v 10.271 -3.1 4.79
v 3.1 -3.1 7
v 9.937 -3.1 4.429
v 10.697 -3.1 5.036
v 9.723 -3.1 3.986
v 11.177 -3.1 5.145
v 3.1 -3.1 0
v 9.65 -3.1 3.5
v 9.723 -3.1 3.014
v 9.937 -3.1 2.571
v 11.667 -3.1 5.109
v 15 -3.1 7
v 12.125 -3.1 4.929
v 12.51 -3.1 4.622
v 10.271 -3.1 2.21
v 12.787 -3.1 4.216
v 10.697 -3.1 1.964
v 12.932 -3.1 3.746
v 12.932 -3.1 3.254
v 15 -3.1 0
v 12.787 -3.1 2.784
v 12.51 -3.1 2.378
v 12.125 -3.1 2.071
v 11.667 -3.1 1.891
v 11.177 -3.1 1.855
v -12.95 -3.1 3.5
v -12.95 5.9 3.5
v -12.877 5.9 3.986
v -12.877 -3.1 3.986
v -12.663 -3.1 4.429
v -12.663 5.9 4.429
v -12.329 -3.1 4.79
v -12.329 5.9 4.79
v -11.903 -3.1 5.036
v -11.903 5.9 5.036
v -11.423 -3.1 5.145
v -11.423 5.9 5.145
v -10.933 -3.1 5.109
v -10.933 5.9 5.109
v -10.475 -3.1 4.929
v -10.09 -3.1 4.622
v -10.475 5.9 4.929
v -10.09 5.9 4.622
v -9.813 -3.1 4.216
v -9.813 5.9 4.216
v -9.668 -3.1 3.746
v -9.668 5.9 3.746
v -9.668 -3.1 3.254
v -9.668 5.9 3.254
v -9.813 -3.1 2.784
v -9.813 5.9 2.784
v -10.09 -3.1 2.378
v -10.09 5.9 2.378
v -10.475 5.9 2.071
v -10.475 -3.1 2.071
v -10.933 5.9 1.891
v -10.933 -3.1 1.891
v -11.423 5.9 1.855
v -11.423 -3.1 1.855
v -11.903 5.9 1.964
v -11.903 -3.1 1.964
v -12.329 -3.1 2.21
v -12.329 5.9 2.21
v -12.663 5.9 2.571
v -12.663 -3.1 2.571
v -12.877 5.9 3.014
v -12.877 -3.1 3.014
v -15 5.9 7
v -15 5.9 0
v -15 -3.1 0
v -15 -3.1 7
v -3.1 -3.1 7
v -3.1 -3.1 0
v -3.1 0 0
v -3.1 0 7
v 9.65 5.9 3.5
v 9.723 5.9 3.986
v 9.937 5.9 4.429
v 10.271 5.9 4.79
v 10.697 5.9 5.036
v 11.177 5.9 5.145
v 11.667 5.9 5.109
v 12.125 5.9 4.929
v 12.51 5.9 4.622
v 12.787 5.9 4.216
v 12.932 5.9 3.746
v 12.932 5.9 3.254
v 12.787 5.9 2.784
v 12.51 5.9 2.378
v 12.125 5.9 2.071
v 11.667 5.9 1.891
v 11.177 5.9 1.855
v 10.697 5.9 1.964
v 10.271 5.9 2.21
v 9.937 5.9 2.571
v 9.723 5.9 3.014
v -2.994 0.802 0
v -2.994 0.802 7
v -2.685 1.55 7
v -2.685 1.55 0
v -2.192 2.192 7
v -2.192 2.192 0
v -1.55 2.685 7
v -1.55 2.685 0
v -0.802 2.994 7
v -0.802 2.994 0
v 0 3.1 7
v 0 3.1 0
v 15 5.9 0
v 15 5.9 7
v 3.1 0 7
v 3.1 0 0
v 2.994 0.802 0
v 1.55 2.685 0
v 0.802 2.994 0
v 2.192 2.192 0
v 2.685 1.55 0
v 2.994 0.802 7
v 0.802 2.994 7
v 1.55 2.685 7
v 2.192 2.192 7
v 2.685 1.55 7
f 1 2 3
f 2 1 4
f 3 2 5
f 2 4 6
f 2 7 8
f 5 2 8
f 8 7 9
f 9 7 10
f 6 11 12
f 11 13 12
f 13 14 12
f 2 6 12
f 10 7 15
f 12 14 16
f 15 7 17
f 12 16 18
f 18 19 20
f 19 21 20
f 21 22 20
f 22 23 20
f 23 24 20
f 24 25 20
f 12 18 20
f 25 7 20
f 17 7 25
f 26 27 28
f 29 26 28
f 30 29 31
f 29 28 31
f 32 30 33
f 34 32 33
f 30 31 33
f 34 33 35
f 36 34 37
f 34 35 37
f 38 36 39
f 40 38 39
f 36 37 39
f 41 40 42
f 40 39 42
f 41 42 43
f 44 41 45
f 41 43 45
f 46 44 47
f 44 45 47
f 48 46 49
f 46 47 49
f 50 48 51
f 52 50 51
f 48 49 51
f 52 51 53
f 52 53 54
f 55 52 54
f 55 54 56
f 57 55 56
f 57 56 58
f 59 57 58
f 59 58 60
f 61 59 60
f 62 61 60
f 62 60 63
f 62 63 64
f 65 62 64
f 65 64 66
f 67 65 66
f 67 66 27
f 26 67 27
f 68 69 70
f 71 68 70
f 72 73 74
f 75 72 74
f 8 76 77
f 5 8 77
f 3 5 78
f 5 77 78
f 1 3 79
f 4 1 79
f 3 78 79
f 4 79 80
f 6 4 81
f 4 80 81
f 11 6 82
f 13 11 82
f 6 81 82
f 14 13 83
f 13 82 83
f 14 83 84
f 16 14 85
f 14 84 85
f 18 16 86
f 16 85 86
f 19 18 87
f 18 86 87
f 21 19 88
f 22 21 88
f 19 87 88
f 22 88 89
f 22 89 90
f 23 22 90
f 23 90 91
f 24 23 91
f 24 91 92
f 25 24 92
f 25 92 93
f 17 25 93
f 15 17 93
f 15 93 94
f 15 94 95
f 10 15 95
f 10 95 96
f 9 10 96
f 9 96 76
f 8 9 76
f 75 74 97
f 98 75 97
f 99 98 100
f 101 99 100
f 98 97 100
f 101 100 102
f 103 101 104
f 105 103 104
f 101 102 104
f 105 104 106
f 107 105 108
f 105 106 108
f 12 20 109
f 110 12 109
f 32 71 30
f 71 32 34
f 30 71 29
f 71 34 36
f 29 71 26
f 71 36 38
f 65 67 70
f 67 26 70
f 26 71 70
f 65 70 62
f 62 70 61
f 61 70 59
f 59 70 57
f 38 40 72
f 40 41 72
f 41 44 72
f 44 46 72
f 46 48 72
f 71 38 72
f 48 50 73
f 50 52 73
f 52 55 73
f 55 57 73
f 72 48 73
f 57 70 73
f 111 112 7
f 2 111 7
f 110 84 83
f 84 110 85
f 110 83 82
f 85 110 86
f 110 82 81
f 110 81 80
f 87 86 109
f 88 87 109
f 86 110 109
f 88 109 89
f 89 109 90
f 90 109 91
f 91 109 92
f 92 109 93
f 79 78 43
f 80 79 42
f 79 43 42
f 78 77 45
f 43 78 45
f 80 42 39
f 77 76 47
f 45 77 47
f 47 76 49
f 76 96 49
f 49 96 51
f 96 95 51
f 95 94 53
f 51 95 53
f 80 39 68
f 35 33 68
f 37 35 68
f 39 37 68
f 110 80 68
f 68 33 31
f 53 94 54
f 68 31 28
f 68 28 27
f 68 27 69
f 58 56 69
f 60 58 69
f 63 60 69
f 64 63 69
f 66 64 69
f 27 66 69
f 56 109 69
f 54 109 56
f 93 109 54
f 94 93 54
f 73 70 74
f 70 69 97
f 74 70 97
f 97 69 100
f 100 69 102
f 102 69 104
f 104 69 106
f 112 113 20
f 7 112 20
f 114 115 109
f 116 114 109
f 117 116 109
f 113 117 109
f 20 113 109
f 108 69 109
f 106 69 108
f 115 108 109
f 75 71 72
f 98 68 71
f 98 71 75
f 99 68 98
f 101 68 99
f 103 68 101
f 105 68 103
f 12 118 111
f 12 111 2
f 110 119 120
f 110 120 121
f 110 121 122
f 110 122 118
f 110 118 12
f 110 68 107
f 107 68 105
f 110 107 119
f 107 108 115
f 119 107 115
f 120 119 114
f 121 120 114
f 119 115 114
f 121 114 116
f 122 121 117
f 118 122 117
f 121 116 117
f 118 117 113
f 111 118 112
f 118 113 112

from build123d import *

# Parameters (mm, degrees)
F1_DEPTH = 7
F2_R     = 1.65
F3_DEPTH = 9.001


with BuildPart() as f1:
    # F0 (on Top) → F1 (new body)
    with BuildSketch(Plane.XY):
        with BuildLine():
            ThreePointArc((0, 3.1), (2.192031, 2.192031), (3.1, 0))
            Line((3.1, 0), (3.1, -3.1))
            Line((3.1, -3.1), (15, -3.1))
            Line((15, -3.1), (15, 5.9))
            Line((15, 5.9), (0, 5.9))
            Line((0, 5.9), (-15, 5.9))
            Line((-15, 5.9), (-15, -3.1))
            Line((-15, -3.1), (-3.1, -3.1))
            Line((-3.1, -3.1), (-3.1, 0))
            ThreePointArc((-3.1, 0), (-2.192031, 2.192031), (0, 3.1))
        make_face()
    extrude(amount=F1_DEPTH)

    # F2 (on face) → F3 (cut, through all)
    with BuildSketch(Plane(origin=(0, 5.9, 0), x_dir=(-1, 0, 0), z_dir=(0, 1, 0))):
        with Locations((11.3, 3.5)):
            Circle(F2_R)
        with Locations((-11.3, 3.5)):
            Circle(F2_R)
    extrude(amount=-F3_DEPTH, mode=Mode.SUBTRACT)


solid = f1.part
